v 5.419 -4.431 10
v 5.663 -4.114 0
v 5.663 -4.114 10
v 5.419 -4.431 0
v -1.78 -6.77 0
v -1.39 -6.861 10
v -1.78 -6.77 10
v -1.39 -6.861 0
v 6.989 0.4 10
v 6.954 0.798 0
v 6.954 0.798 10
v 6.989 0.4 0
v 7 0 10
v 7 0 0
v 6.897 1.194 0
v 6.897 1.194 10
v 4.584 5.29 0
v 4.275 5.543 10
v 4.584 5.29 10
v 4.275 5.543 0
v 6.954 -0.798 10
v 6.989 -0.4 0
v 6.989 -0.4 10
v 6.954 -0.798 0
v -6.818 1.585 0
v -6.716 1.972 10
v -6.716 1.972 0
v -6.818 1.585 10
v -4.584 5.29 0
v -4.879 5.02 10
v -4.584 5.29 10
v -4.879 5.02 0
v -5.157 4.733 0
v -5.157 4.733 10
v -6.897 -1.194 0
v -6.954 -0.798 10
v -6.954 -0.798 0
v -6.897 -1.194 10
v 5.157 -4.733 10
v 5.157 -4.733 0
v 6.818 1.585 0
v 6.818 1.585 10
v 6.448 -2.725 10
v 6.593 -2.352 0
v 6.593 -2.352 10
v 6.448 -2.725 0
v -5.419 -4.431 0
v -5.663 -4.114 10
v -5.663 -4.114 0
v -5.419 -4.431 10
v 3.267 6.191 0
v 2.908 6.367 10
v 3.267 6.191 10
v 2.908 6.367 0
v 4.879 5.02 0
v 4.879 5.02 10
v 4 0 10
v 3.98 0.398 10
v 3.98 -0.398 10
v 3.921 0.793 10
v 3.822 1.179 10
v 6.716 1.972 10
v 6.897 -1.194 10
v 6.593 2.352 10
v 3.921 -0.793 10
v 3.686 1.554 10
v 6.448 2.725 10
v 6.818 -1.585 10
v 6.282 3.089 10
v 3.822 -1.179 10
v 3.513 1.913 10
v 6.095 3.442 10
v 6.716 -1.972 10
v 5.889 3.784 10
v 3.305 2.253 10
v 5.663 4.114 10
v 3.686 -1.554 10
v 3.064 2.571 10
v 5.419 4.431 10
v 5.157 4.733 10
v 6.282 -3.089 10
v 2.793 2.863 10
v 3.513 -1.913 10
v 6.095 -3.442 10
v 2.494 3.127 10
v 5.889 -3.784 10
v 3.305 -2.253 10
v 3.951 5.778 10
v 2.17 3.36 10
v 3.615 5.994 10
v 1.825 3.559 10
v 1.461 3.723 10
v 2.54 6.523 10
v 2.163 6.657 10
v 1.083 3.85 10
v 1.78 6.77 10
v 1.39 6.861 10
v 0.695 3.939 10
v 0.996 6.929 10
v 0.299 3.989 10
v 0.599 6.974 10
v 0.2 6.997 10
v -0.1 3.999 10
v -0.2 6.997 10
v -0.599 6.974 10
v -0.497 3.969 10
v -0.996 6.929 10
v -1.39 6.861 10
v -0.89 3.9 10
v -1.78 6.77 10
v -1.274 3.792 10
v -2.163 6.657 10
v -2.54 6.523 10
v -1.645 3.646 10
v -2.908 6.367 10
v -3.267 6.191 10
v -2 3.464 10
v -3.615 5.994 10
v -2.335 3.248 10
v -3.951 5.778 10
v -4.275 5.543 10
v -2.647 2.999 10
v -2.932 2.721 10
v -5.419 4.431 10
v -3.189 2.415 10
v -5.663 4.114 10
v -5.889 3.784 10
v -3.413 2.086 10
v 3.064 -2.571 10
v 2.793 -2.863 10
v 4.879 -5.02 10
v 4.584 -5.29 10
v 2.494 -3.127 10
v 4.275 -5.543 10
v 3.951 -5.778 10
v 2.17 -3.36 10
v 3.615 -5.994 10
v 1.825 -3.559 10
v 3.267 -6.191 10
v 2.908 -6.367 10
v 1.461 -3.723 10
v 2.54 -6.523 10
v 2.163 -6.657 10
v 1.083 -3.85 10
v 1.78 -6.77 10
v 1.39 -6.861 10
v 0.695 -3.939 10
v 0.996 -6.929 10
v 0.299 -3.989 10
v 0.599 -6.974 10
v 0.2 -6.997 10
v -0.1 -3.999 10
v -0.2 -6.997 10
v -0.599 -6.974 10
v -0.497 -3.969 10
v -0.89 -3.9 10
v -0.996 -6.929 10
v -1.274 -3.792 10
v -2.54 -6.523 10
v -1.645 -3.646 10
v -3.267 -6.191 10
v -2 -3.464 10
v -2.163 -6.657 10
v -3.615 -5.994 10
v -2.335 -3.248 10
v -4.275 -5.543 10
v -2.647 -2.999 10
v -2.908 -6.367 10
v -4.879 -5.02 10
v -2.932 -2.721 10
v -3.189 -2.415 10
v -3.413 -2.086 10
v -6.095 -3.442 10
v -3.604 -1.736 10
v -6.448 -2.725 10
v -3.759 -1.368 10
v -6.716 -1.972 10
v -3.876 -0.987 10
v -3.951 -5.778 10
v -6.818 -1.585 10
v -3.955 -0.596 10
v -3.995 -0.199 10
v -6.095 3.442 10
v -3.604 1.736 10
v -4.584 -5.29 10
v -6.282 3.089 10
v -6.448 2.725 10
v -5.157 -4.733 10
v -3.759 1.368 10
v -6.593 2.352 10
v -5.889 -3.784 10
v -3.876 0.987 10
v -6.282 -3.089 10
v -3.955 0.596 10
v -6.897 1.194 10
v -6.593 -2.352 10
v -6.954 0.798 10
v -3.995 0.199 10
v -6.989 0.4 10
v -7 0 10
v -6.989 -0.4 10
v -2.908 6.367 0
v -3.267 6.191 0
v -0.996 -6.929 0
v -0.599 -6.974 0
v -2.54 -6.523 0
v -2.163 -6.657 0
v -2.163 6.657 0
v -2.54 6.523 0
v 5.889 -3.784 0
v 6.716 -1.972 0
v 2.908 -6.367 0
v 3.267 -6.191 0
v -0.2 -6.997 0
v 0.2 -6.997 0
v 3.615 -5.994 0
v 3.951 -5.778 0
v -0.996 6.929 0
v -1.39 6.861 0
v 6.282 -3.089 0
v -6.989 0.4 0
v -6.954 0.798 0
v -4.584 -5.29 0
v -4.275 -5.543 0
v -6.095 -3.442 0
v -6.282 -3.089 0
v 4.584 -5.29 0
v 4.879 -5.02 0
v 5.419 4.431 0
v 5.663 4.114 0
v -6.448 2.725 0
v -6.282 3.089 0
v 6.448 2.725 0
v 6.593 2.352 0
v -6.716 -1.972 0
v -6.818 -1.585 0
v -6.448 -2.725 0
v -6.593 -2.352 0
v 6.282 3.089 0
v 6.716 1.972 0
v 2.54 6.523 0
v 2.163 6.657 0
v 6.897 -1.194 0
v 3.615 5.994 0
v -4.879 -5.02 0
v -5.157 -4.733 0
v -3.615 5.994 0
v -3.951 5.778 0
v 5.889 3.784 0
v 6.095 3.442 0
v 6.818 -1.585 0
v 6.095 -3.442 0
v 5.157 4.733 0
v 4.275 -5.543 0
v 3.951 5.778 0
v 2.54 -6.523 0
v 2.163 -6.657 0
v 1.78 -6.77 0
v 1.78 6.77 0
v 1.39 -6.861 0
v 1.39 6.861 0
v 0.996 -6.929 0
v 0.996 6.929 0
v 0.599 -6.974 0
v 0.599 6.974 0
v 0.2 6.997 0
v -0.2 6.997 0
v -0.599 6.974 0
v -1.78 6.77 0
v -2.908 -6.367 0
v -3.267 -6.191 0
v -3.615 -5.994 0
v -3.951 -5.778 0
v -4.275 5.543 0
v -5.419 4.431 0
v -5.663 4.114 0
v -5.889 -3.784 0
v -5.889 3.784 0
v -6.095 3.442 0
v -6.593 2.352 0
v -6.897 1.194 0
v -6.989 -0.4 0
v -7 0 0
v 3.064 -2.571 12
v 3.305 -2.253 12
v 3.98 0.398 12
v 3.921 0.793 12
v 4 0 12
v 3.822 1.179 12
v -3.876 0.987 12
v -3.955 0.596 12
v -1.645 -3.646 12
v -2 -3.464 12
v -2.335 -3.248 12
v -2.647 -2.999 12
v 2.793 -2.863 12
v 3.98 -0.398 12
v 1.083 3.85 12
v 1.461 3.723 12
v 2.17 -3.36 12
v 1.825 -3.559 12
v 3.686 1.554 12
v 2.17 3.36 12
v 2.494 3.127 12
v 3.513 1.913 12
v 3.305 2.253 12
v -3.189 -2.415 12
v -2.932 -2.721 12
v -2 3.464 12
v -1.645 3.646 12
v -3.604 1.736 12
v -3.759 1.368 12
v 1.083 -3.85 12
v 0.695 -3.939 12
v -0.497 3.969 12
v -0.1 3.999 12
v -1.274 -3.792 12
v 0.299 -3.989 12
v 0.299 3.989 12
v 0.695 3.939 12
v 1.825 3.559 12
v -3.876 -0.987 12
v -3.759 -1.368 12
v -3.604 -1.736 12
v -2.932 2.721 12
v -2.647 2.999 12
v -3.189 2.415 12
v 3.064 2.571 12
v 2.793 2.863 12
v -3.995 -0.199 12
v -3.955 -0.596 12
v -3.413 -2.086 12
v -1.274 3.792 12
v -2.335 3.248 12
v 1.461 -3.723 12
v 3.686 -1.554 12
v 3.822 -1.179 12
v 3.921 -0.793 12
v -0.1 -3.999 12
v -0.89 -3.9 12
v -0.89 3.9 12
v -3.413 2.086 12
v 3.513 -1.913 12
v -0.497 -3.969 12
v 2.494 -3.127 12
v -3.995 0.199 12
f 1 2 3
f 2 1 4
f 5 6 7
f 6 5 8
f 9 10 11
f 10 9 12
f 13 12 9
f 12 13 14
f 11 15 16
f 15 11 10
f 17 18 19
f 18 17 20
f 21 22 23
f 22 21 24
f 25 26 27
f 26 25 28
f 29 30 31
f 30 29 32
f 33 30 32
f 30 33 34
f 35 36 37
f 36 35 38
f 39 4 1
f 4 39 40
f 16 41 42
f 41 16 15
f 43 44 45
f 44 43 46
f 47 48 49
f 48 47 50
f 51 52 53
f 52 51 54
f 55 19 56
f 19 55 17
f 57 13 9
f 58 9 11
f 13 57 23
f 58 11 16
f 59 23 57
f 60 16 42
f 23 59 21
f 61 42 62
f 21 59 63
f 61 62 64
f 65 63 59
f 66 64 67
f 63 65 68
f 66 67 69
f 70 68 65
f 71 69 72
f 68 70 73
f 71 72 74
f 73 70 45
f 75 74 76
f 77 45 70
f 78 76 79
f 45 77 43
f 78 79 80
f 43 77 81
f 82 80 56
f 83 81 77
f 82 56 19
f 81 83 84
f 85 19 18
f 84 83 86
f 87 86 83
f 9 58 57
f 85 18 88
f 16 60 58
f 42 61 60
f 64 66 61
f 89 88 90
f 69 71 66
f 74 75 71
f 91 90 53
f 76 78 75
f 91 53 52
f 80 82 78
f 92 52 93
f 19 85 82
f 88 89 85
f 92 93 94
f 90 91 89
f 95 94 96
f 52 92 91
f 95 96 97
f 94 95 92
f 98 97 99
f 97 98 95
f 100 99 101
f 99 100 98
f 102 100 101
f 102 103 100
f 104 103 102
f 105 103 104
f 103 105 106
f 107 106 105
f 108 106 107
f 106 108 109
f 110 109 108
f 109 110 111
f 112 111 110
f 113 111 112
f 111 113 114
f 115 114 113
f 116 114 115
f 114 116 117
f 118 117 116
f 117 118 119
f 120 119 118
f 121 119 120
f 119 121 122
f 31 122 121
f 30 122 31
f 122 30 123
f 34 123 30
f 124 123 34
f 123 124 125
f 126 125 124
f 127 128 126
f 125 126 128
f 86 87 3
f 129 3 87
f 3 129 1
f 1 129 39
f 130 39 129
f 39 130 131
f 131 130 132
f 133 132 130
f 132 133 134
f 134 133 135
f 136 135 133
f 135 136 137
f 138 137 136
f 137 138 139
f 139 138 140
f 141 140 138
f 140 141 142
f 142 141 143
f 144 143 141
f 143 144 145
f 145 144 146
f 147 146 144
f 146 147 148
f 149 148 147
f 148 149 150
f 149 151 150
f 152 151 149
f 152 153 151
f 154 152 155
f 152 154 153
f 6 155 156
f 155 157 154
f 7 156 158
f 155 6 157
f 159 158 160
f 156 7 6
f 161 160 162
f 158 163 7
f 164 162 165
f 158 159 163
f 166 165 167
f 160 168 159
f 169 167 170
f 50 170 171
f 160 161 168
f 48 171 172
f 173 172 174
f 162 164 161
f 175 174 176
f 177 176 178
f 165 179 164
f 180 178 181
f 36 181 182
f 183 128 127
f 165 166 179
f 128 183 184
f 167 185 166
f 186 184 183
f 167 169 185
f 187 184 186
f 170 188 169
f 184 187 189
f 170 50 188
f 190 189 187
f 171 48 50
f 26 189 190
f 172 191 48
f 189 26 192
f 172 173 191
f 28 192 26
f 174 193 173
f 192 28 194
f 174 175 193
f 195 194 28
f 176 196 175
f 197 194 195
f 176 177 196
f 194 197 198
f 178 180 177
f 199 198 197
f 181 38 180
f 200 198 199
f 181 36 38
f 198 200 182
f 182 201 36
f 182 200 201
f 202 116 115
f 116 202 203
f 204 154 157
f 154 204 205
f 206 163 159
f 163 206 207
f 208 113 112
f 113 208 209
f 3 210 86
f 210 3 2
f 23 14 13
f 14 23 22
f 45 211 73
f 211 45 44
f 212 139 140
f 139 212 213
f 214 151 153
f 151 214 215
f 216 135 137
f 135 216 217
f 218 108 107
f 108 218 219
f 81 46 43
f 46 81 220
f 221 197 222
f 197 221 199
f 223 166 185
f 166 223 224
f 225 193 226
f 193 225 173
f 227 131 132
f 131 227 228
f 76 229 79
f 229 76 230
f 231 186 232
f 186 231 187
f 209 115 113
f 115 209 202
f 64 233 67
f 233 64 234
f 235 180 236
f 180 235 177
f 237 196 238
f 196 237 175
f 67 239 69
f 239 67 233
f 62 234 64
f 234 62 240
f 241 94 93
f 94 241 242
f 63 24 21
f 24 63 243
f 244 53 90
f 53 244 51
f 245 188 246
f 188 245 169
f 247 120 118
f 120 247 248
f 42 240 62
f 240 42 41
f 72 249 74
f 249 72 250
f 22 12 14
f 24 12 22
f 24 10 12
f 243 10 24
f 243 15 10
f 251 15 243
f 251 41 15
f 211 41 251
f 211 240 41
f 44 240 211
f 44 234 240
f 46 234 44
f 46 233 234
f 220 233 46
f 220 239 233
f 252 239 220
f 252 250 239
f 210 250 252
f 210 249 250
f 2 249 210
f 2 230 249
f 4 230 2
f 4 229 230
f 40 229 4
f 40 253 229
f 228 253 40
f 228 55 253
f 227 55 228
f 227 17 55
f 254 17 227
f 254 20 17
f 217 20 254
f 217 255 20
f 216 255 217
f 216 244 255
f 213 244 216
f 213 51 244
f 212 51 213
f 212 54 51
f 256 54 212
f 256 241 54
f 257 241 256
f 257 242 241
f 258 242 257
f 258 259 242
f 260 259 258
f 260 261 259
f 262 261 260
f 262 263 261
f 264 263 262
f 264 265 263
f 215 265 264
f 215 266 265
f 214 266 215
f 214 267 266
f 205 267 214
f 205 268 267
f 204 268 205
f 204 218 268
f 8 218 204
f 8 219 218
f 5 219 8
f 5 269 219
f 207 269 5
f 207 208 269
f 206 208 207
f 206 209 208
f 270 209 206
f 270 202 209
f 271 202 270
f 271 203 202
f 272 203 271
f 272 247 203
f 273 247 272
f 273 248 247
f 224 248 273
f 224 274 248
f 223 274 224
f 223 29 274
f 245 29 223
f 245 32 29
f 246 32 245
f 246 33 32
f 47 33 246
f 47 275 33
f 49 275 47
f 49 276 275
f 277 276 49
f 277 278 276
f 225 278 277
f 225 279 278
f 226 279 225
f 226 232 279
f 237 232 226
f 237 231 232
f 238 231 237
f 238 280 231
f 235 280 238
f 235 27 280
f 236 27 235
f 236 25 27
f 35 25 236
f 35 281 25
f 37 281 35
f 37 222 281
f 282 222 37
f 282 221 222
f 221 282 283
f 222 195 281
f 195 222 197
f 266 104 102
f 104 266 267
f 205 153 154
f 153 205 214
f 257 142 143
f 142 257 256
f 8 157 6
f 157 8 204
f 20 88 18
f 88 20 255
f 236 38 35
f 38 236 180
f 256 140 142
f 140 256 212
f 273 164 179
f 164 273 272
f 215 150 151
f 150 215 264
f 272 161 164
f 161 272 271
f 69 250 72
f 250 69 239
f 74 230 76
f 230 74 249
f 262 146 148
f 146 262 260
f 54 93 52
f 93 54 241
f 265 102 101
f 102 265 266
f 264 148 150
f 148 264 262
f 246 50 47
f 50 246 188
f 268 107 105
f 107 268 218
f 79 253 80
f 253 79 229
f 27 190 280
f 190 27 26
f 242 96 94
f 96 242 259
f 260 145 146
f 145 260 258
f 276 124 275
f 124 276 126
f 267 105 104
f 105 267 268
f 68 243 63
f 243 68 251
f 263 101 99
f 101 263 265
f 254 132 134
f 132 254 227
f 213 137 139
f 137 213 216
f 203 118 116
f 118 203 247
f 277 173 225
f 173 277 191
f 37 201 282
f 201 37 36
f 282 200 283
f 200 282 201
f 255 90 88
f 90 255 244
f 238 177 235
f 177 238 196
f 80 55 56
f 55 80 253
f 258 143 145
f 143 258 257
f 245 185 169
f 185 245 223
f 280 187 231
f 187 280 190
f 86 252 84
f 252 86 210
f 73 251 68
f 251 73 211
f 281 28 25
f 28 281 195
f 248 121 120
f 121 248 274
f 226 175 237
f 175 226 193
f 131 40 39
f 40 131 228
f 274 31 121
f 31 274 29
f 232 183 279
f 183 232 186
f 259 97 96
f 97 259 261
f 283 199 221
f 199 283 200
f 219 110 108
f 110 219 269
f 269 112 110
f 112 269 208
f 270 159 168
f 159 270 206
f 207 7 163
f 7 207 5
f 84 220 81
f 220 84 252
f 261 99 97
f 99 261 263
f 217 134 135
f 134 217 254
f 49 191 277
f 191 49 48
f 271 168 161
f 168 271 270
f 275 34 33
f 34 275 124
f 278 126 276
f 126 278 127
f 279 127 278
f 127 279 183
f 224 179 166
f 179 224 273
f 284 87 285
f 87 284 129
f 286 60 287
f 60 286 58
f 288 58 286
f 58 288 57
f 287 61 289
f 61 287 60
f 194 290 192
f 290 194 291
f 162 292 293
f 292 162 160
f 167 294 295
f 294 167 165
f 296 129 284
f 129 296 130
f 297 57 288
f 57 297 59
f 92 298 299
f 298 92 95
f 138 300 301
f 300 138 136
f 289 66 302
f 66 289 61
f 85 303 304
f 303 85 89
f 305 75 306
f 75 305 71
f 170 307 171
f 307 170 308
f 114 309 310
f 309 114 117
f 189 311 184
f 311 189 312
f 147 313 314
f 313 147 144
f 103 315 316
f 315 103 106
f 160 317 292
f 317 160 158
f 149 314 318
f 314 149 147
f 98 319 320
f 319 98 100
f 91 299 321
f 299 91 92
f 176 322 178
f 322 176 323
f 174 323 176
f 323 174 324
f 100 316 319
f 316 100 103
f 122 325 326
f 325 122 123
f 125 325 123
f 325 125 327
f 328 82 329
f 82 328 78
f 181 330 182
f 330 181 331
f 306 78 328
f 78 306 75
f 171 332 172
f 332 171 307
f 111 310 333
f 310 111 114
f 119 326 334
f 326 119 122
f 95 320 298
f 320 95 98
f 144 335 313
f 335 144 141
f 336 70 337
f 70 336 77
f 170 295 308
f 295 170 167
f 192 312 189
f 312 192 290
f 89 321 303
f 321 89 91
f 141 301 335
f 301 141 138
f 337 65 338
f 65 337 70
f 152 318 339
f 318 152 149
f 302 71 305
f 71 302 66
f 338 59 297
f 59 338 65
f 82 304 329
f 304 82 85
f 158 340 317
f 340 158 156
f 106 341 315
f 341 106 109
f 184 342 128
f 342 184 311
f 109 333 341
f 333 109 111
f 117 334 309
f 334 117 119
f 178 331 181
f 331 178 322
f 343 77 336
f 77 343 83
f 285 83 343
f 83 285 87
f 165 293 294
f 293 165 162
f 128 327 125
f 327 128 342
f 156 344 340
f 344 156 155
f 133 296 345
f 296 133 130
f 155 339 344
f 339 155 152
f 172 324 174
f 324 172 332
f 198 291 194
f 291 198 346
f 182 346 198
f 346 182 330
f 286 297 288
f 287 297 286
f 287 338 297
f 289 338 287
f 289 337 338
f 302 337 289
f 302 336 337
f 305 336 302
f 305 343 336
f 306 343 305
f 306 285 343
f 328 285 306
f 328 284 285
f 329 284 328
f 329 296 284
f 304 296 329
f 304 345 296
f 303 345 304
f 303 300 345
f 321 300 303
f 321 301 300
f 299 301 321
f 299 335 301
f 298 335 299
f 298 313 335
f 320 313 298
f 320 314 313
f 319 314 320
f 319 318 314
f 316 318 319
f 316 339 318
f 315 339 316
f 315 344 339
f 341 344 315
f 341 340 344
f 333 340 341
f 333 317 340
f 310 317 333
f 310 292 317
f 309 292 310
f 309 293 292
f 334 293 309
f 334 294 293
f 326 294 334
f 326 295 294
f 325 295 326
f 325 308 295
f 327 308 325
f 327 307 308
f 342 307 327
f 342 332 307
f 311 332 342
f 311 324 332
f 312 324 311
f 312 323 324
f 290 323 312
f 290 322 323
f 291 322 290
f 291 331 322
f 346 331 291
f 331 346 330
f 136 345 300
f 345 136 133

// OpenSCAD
$fa = 2;
$fs = 0.4;

module gimbal_pitch_motor() {
  color("#3a3a42")
    union() {
      cylinder(h = 10, d = 14);
      translate([0, 0, 10])
        cylinder(h = 2, d = 8);
    }
}

gimbal_pitch_motor();
